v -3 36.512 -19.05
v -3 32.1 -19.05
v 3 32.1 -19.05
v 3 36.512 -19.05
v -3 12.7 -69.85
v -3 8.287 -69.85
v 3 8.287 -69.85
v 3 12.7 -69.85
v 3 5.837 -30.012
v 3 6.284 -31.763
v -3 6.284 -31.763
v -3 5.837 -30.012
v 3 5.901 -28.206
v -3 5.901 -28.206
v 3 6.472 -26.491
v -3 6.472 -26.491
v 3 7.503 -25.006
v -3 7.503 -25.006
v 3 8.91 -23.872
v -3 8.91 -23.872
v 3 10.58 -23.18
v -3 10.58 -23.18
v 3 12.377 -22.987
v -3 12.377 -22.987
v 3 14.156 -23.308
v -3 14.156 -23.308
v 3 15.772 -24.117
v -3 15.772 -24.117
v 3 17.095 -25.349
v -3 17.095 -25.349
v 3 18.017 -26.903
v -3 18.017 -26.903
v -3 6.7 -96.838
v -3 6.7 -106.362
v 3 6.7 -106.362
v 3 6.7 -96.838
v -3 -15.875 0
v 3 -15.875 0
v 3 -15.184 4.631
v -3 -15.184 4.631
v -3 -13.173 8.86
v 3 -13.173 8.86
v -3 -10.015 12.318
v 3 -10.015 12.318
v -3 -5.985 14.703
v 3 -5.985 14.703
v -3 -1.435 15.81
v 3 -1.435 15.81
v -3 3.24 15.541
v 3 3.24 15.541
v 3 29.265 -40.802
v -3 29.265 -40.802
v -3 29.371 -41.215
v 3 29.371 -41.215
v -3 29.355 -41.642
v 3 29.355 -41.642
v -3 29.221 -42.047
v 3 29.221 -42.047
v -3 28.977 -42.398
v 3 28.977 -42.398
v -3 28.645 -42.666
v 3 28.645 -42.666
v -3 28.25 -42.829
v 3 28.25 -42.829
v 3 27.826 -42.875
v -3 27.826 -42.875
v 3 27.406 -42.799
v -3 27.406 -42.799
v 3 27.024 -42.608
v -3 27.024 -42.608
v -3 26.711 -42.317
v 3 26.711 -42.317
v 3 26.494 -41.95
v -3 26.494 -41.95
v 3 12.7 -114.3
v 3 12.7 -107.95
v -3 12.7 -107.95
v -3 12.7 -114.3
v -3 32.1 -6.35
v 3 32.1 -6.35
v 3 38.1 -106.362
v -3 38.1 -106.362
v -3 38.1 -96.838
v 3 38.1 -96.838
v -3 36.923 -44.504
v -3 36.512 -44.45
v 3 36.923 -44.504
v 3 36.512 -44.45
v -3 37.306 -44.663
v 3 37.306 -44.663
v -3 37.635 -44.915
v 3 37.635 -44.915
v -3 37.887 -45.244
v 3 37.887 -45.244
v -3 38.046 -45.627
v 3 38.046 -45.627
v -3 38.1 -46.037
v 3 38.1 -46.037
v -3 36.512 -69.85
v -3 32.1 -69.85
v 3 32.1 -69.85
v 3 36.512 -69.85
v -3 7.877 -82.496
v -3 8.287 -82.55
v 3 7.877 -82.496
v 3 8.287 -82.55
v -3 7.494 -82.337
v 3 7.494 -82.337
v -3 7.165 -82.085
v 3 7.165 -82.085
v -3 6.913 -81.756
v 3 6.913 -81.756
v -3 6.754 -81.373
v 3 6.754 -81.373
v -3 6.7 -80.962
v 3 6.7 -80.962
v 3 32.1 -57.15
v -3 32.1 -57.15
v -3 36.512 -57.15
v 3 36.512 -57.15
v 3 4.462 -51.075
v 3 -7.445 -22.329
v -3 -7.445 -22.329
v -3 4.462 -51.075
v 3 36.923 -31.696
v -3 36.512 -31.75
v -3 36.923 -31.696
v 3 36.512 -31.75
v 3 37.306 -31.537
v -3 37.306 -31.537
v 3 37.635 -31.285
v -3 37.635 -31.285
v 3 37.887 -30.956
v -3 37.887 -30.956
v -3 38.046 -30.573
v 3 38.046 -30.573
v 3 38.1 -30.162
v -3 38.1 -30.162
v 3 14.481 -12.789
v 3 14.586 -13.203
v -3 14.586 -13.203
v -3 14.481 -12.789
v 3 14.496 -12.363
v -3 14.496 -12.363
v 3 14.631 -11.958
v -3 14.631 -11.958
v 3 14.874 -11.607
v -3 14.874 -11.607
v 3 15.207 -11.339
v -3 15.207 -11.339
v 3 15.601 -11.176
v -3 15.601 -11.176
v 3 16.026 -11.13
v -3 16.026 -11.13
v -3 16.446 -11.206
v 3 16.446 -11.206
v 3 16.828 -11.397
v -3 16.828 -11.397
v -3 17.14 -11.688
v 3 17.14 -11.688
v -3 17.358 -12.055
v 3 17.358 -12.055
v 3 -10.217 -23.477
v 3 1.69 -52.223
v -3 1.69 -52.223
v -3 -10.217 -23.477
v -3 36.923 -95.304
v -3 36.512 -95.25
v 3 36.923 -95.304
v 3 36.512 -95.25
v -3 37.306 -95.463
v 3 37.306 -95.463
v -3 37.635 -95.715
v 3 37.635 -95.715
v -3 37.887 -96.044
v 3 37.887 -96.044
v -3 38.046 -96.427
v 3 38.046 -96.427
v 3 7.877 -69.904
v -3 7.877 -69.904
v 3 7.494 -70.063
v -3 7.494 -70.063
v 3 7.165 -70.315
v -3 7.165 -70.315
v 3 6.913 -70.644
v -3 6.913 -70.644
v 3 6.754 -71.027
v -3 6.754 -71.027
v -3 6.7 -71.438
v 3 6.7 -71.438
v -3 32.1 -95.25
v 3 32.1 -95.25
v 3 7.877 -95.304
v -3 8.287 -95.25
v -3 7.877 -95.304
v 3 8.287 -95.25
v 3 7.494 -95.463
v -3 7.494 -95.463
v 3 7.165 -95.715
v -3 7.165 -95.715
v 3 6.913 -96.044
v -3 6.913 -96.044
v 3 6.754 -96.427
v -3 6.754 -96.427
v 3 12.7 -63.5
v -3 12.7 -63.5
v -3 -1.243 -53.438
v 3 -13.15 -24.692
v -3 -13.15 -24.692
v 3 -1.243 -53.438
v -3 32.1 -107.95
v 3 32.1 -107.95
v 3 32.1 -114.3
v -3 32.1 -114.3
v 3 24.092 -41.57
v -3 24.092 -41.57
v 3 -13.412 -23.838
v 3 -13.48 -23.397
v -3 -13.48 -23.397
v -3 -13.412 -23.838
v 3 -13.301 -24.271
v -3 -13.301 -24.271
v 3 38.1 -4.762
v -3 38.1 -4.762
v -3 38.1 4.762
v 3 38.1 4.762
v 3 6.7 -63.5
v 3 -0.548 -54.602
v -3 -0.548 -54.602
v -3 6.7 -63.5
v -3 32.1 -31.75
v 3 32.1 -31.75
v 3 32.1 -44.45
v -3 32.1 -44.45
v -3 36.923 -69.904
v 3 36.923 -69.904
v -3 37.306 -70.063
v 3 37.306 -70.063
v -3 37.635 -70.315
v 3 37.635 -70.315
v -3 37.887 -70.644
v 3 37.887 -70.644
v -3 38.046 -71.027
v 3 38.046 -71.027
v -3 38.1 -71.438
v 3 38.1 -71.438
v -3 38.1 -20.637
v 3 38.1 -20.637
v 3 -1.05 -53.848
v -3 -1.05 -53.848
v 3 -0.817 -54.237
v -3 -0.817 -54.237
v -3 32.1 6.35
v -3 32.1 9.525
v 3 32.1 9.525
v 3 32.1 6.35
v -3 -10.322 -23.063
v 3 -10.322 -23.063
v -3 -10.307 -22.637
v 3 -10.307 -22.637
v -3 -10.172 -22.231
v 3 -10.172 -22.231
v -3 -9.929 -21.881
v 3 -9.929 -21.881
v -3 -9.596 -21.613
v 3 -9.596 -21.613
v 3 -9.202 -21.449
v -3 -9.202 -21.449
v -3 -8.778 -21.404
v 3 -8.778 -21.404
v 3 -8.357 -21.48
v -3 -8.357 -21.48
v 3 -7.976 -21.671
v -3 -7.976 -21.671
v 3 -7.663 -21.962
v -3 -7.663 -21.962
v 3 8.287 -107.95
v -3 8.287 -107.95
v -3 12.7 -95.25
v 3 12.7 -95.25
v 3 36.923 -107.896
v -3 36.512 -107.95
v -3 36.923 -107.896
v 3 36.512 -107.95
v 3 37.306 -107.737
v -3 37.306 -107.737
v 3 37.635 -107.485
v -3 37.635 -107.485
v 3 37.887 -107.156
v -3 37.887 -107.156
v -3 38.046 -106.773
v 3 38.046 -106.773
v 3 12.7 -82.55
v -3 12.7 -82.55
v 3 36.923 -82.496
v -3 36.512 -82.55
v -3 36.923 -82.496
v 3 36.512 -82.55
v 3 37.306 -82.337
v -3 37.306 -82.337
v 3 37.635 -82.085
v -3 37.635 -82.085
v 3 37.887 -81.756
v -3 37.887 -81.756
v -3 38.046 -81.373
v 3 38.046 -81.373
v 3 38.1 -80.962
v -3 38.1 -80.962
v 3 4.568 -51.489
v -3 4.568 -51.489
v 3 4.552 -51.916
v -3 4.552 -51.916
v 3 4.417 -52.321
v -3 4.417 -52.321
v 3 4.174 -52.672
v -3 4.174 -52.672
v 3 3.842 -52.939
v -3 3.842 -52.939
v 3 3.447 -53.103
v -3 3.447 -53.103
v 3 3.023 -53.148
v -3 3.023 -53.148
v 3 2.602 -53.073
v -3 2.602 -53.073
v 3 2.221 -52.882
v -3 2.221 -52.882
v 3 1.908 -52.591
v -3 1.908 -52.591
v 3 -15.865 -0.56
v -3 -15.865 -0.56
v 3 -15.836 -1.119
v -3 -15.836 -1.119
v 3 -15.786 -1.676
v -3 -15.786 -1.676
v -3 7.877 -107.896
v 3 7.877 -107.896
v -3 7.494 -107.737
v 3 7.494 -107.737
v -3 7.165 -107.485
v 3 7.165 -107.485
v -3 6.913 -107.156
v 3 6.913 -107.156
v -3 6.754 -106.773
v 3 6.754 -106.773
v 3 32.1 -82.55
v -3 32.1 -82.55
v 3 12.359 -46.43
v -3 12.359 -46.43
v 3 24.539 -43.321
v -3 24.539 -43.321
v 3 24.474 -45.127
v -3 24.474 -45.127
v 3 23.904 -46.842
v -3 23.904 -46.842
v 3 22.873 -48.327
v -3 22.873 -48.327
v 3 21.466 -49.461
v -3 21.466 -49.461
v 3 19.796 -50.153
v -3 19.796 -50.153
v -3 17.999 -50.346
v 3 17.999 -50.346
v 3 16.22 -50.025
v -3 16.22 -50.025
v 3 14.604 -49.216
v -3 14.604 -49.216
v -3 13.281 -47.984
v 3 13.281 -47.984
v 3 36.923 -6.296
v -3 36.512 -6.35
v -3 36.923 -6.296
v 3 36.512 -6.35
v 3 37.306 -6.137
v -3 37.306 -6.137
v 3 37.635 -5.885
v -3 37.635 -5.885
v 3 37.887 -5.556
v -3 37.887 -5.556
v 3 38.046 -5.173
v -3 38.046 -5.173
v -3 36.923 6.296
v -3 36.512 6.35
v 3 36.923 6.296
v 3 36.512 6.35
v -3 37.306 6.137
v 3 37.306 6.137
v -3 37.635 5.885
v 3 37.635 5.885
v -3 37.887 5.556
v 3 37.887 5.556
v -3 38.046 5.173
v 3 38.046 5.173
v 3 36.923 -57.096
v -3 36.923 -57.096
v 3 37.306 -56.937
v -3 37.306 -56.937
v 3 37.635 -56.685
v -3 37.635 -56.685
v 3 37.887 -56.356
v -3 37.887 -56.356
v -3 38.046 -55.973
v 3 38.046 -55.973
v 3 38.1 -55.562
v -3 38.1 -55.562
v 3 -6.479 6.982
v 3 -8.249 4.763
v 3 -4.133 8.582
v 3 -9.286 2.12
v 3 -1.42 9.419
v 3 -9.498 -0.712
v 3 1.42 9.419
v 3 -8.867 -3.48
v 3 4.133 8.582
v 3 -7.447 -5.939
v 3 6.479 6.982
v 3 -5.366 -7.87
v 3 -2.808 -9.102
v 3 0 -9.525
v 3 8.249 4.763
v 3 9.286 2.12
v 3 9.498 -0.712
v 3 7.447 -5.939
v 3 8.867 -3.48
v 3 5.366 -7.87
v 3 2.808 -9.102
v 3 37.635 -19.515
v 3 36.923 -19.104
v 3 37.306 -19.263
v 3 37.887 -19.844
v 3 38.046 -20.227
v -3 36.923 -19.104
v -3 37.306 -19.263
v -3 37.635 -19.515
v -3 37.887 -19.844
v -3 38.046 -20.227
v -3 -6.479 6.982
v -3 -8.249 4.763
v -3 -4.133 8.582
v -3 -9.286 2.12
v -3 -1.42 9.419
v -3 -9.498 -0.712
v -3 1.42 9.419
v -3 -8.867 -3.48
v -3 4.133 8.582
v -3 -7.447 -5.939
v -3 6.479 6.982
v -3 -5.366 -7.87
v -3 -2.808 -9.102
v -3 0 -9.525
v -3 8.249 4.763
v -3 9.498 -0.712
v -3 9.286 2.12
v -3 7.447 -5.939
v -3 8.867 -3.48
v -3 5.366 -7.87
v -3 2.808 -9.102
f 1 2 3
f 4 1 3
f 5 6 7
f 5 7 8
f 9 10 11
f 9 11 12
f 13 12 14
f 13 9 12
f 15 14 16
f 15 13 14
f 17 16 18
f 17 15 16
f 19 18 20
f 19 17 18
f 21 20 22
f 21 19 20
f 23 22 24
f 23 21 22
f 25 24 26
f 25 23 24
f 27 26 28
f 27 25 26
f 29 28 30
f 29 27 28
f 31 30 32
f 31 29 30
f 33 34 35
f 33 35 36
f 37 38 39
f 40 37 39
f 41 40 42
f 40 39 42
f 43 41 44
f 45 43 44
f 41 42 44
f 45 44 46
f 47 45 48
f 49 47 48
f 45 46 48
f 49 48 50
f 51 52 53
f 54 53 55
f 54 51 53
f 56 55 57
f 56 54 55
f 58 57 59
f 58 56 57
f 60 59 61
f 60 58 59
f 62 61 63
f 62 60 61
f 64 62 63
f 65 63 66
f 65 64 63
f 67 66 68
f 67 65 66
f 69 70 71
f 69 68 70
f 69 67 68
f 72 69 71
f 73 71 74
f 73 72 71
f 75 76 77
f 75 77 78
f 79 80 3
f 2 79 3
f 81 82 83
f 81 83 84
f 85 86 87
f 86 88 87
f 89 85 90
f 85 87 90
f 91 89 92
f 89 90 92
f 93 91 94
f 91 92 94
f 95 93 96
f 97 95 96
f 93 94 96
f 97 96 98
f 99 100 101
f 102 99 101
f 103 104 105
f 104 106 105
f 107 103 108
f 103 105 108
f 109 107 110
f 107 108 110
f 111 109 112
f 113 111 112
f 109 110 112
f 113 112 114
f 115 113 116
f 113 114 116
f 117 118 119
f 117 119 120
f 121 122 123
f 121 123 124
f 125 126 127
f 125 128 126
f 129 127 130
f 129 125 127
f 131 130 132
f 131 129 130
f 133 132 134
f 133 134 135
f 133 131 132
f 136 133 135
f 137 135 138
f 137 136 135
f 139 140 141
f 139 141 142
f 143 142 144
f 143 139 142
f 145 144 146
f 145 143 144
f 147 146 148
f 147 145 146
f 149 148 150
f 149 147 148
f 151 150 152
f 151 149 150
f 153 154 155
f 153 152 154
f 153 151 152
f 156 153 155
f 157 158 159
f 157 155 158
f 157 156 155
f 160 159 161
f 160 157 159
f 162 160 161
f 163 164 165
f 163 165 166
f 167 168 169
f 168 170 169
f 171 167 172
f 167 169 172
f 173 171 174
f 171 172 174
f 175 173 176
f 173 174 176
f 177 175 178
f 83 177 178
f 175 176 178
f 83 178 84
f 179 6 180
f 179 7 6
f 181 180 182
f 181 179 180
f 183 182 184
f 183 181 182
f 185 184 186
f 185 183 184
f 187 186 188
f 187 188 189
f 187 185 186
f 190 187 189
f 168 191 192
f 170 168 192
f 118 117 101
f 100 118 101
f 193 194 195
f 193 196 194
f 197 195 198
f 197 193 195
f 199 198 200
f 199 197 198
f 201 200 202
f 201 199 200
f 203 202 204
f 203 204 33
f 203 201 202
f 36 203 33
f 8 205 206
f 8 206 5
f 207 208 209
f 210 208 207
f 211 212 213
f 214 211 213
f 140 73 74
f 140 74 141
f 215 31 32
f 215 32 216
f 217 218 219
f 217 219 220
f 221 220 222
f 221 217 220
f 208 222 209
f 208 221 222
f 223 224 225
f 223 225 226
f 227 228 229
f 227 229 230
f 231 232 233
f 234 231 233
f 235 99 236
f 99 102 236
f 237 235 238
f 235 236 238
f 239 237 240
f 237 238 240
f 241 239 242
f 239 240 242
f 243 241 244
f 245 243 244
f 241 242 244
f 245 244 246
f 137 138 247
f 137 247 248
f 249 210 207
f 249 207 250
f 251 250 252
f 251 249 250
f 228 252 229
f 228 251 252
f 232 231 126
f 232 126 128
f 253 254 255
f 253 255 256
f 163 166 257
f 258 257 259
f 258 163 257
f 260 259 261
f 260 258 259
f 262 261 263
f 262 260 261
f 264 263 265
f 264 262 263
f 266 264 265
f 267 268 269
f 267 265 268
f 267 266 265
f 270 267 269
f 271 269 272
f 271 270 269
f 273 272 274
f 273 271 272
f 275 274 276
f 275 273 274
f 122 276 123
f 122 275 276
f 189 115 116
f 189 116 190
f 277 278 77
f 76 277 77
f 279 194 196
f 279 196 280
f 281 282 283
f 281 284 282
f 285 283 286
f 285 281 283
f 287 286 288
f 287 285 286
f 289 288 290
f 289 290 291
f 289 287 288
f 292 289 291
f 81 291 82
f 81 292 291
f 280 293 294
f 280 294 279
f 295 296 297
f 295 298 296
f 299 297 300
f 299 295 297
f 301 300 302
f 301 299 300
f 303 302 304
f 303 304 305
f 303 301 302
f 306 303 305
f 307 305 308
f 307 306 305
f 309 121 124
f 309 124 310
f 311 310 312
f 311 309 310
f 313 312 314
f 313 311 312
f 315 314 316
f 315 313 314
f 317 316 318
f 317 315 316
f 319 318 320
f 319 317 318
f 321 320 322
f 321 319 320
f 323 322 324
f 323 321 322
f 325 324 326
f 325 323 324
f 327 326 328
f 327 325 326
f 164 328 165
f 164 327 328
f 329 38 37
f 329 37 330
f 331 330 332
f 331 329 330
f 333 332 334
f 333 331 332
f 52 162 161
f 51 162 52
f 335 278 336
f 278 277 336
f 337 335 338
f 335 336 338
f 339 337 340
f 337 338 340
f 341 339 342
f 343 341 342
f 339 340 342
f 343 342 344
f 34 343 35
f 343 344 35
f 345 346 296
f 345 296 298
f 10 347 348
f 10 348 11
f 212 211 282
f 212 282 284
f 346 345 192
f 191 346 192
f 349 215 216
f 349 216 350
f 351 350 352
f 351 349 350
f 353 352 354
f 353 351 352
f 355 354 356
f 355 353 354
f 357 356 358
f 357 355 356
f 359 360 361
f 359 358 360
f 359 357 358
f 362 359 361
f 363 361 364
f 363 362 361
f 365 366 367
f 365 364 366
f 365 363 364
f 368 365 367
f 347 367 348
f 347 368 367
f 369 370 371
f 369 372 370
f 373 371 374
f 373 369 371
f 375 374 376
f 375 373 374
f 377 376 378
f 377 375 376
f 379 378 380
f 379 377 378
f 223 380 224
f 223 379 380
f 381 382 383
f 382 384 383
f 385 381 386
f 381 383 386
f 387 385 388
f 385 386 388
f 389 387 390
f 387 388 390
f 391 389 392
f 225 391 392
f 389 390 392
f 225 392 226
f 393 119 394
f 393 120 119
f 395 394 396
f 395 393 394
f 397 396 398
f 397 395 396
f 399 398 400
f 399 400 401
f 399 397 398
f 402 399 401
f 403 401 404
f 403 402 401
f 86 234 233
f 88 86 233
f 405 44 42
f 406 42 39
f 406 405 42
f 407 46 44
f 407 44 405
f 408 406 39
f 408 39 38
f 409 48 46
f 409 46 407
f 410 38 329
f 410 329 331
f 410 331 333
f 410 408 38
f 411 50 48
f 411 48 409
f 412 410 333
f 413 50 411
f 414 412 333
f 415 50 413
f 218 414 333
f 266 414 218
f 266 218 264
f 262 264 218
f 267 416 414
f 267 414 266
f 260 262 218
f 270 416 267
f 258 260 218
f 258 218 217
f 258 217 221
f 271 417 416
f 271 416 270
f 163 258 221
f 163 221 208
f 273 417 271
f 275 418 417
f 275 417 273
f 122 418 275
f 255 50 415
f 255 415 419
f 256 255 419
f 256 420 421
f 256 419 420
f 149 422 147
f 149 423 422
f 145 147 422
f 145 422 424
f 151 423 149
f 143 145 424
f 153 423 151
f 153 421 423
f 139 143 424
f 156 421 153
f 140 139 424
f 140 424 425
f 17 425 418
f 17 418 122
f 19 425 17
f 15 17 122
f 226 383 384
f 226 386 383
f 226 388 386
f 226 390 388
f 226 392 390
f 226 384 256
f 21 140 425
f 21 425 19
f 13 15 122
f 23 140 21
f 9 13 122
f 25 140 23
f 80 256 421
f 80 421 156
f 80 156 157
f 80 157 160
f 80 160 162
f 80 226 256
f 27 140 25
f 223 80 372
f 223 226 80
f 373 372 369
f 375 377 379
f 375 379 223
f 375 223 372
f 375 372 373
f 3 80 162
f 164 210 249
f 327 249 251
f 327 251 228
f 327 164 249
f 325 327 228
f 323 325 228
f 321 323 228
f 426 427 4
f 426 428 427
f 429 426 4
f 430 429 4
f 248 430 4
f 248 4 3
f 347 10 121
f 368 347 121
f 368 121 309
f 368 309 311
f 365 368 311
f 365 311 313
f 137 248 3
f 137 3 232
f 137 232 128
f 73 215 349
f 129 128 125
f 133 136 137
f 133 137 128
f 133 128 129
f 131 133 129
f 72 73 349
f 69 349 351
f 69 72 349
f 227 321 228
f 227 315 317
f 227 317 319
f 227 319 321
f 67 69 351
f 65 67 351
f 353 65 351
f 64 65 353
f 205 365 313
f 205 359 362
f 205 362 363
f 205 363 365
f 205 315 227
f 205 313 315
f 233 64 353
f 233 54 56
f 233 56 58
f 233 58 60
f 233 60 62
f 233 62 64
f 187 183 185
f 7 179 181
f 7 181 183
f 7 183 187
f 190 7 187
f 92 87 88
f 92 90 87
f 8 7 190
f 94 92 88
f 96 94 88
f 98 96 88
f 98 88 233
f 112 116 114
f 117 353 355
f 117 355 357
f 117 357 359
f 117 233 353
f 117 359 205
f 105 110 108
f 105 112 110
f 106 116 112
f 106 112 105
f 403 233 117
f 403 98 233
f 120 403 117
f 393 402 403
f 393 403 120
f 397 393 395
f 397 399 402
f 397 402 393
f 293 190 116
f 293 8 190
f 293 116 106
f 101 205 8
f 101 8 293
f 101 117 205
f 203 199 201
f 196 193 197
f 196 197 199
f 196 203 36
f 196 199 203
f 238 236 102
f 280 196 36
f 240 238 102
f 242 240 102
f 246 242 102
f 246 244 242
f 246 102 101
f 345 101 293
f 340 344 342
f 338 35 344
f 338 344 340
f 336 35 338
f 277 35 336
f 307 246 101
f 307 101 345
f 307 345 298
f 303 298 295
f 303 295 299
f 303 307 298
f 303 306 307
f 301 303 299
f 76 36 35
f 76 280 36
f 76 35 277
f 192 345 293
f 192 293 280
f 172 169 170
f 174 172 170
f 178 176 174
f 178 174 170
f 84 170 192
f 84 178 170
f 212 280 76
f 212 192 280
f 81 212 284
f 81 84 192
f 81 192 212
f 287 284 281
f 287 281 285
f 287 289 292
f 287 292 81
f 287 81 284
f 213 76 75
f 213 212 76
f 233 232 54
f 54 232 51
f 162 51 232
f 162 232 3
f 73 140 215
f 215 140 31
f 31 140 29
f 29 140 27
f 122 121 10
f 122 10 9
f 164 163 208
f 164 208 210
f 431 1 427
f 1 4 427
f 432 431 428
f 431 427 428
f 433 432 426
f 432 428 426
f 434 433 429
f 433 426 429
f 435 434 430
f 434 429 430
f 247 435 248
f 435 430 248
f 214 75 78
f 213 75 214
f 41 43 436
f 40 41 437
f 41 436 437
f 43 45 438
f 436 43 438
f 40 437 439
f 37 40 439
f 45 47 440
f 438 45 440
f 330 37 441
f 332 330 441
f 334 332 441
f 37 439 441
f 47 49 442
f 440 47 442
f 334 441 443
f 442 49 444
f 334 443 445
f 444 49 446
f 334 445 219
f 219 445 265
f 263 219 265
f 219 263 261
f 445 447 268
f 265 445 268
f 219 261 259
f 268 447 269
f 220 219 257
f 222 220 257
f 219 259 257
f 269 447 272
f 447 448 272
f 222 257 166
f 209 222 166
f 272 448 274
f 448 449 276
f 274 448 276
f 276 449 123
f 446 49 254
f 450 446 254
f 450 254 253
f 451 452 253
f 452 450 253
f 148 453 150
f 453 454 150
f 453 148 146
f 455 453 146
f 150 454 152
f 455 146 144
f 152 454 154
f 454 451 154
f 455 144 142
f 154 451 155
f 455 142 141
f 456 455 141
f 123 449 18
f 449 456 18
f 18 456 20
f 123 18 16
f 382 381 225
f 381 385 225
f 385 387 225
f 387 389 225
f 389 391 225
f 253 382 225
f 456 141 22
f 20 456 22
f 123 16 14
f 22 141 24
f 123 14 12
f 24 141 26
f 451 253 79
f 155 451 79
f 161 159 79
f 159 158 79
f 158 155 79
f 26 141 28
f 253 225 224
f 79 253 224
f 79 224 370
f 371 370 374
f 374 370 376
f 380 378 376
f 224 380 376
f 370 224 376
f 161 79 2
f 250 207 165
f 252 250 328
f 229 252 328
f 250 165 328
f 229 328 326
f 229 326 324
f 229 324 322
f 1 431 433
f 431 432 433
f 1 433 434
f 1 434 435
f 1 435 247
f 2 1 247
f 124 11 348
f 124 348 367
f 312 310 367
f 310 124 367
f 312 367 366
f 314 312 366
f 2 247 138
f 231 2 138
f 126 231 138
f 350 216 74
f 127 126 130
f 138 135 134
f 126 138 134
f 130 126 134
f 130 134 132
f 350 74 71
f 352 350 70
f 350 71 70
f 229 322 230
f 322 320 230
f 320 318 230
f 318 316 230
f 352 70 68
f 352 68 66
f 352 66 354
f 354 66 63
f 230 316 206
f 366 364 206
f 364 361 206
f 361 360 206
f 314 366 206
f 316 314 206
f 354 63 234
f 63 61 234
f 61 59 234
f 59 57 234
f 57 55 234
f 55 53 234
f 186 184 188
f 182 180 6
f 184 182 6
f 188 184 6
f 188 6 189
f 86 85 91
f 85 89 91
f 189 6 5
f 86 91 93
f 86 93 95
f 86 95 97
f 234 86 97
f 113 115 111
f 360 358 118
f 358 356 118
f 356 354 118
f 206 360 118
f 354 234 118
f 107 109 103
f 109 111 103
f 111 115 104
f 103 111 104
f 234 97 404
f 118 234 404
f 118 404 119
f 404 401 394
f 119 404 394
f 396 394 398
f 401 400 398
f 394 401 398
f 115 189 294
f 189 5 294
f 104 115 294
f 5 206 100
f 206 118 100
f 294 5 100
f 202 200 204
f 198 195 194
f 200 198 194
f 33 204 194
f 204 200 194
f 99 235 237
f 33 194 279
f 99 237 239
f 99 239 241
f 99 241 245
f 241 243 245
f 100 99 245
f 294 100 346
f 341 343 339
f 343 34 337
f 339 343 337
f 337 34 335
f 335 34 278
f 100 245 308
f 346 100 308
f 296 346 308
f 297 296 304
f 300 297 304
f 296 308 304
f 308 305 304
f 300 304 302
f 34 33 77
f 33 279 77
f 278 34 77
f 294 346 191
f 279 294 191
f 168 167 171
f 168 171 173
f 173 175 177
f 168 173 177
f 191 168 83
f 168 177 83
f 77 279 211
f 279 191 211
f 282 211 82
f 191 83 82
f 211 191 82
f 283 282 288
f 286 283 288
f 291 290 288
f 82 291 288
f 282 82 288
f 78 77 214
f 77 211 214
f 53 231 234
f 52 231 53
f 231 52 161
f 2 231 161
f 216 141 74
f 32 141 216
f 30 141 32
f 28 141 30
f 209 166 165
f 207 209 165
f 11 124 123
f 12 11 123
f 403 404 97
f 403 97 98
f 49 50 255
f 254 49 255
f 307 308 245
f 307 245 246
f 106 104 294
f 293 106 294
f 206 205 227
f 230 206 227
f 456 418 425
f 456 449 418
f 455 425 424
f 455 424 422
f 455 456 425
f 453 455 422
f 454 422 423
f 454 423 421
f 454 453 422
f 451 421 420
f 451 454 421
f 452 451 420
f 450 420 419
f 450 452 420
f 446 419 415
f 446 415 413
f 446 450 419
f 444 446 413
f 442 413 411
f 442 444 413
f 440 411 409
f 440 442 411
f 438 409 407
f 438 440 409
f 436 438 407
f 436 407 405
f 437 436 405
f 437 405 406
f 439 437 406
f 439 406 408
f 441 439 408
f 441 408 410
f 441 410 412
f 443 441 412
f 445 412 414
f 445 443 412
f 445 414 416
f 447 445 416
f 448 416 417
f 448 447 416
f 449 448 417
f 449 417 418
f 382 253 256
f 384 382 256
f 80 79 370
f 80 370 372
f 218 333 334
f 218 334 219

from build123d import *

# Parameters (mm, degrees)
SKETCH1_R              = 9.525
BOSS_EXTRUDE1_DEPTH    = 3
CUT_EXTRUDE1_DEPTH     = 72.404901793
SKETCH4_W              = 50.8
SKETCH4_H              = 19.4
BOSS_EXTRUDE3_DEPTH    = 6
SKETCH3_W              = 6
SKETCH3_H              = 12.7
BOSS_EXTRUDE2_DEPTH    = 6
FILLET1_R              = 1.5875
LPATTERN1_COUNT        = 5
LPATTERN1_PITCH        = 25.4
FILLET1_OF_LPATTERN1_R = 1.5875
SKETCH5_W              = 12.7
SKETCH5_H              = 6
BOSS_EXTRUDE4_DEPTH    = 6
FILLET2_R              = 1.5875
LPATTERN2_COUNT        = 2
LPATTERN2_PITCH        = 25.4
FILLET2_OF_LPATTERN2_R = 1.5875


with BuildPart() as part:
    # Sketch1 → Boss-Extrude1 (new, symmetric)
    with BuildSketch(Plane(origin=(0, 0, 0), x_dir=(0, 0, -1), z_dir=(1, 0, 0))):
        with BuildLine():
            Line((-15.540953853, 3.23950279), (-9.525, 32.1))
            Line((-9.525, 32.1), (63.5, 32.1))
            Line((63.5, 32.1), (63.5, -15.875))
            Line((63.5, -15.875), (0, -15.875))
            ThreePointArc((0, -15.875), (-12.317522717, -10.014702148), (-15.540953853, 3.23950279))
        make_face()
        Circle(SKETCH1_R, mode=Mode.SUBTRACT)
    extrude(amount=BOSS_EXTRUDE1_DEPTH, both=True)

    # Sketch2 → Cut-Extrude1 (cut, through all)
    with BuildSketch(Plane(origin=(3, 0, 0), x_dir=(0, 0, -1), z_dir=(1, 0, 0))):
        with BuildLine():
            Line((1.676231888, -15.786255783), (23.396510982, -13.47993154))
            ThreePointArc((23.396510982, -13.47993154), (24.056064004, -13.361605673), (24.691925535, -13.150202478))
            Line((24.691925535, -13.150202478), (53.43843719, -1.24300748))
            ThreePointArc((53.43843719, -1.24300748), (54.045535898, -0.938110333), (54.602034594, -0.548443406))
            Line((54.602034594, -0.548443406), (63.5, 6.7))
            Line((63.5, 6.7), (63.5, -15.875))
            Line((63.5, -15.875), (0, -15.875))
            ThreePointArc((0, -15.875), (0.839289711, -15.852798421), (1.676231888, -15.786255783))
        make_face()
        with BuildLine():
            Line((26.903135362, 18.016834009), (41.56972294, 24.091933498))
            ThreePointArc((41.56972294, 24.091933498), (49.866397767, 20.655338262), (46.429802531, 12.358663435))
            Line((46.429802531, 12.358663435), (31.763214953, 6.283563946))
            ThreePointArc((31.763214953, 6.283563946), (23.466540126, 9.720159182), (26.903135362, 18.016834009))
        make_face()
        with BuildLine():
            Line((22.328855341, -7.445246365), (51.075366995, 4.461948633))
            ThreePointArc((51.075366995, 4.461948633), (53.035211442, 3.650154483), (52.223417292, 1.690310036))
            Line((52.223417292, 1.690310036), (23.476905638, -10.216884962))
            ThreePointArc((23.476905638, -10.216884962), (21.51706119, -9.405090812), (22.328855341, -7.445246365))
        make_face()
        with BuildLine():
            Line((12.055034553, 17.357951117), (40.801546208, 29.265146115))
            ThreePointArc((40.801546208, 29.265146115), (42.761390655, 28.453351965), (41.949596505, 26.493507518))
            Line((41.949596505, 26.493507518), (13.203084851, 14.58631252))
            ThreePointArc((13.203084851, 14.58631252), (11.243240403, 15.39810667), (12.055034553, 17.357951117))
        make_face()
    extrude(amount=-CUT_EXTRUDE1_DEPTH, mode=Mode.SUBTRACT)

    # Sketch4 → Boss-Extrude3 (add)
    with BuildSketch(Plane(origin=(3, 0, 0), x_dir=(0, 0, -1), z_dir=(1, 0, 0))):
        with Locations((88.9, 22.4)):
            Rectangle(SKETCH4_W, SKETCH4_H)
    extrude(amount=-BOSS_EXTRUDE3_DEPTH)

    # Sketch3 → Boss-Extrude2 (add)
    with BuildSketch(Plane(origin=(0, 32.1, 0), x_dir=(1, 0, 0), z_dir=(0, 1, 0))):
        Rectangle(SKETCH3_W, SKETCH3_H)
    boss_extrude2 = extrude(amount=BOSS_EXTRUDE2_DEPTH)

    # Fillet1
    fillet1_edges = [part.edges().sort_by_distance(p)[0] for p in [
        (0, 38.1, -6.35),
        (0, 38.1, 6.35),
    ]]
    fillet(fillet1_edges, radius=FILLET1_R)

    # LPattern1: Boss-Extrude2 ×5
    with Locations(*[(0, 0, -i * LPATTERN1_PITCH) for i in range(1, LPATTERN1_COUNT)]):
        add(boss_extrude2)

    # Fillet1 of LPattern1
    fillet1_of_lpattern1_edges = [part.edges().sort_by_distance(p)[0] for p in [
        (0, 38.1, -31.75),
        (0, 38.1, -19.05),
        (0, 38.1, -57.15),
        (0, 38.1, -44.45),
        (0, 38.1, -82.55),
        (0, 38.1, -69.85),
        (0, 38.1, -107.95),
        (0, 38.1, -95.25),
    ]]
    fillet(fillet1_of_lpattern1_edges, radius=FILLET1_OF_LPATTERN1_R)

    # Sketch5 → Boss-Extrude4 (add)
    with BuildSketch(Plane.ZY.offset(3)):
        with Locations((-76.2, 9.7)):
            Rectangle(SKETCH5_W, SKETCH5_H)
    boss_extrude4 = extrude(amount=-BOSS_EXTRUDE4_DEPTH)

    # Fillet2
    fillet2_edges = [part.edges().sort_by_distance(p)[0] for p in [
        (0, 6.7, -82.55),
        (0, 6.7, -69.85),
    ]]
    fillet(fillet2_edges, radius=FILLET2_R)

    # LPattern2: Boss-Extrude4 ×2
    with Locations(*[(0, 0, -i * LPATTERN2_PITCH) for i in range(1, LPATTERN2_COUNT)]):
        add(boss_extrude4)

    # Fillet2 of LPattern2
    fillet2_of_lpattern2_edges = [part.edges().sort_by_distance(p)[0] for p in [
        (0, 6.7, -107.95),
        (0, 6.7, -95.25),
    ]]
    fillet(fillet2_of_lpattern2_edges, radius=FILLET2_OF_LPATTERN2_R)


solid = part.part
